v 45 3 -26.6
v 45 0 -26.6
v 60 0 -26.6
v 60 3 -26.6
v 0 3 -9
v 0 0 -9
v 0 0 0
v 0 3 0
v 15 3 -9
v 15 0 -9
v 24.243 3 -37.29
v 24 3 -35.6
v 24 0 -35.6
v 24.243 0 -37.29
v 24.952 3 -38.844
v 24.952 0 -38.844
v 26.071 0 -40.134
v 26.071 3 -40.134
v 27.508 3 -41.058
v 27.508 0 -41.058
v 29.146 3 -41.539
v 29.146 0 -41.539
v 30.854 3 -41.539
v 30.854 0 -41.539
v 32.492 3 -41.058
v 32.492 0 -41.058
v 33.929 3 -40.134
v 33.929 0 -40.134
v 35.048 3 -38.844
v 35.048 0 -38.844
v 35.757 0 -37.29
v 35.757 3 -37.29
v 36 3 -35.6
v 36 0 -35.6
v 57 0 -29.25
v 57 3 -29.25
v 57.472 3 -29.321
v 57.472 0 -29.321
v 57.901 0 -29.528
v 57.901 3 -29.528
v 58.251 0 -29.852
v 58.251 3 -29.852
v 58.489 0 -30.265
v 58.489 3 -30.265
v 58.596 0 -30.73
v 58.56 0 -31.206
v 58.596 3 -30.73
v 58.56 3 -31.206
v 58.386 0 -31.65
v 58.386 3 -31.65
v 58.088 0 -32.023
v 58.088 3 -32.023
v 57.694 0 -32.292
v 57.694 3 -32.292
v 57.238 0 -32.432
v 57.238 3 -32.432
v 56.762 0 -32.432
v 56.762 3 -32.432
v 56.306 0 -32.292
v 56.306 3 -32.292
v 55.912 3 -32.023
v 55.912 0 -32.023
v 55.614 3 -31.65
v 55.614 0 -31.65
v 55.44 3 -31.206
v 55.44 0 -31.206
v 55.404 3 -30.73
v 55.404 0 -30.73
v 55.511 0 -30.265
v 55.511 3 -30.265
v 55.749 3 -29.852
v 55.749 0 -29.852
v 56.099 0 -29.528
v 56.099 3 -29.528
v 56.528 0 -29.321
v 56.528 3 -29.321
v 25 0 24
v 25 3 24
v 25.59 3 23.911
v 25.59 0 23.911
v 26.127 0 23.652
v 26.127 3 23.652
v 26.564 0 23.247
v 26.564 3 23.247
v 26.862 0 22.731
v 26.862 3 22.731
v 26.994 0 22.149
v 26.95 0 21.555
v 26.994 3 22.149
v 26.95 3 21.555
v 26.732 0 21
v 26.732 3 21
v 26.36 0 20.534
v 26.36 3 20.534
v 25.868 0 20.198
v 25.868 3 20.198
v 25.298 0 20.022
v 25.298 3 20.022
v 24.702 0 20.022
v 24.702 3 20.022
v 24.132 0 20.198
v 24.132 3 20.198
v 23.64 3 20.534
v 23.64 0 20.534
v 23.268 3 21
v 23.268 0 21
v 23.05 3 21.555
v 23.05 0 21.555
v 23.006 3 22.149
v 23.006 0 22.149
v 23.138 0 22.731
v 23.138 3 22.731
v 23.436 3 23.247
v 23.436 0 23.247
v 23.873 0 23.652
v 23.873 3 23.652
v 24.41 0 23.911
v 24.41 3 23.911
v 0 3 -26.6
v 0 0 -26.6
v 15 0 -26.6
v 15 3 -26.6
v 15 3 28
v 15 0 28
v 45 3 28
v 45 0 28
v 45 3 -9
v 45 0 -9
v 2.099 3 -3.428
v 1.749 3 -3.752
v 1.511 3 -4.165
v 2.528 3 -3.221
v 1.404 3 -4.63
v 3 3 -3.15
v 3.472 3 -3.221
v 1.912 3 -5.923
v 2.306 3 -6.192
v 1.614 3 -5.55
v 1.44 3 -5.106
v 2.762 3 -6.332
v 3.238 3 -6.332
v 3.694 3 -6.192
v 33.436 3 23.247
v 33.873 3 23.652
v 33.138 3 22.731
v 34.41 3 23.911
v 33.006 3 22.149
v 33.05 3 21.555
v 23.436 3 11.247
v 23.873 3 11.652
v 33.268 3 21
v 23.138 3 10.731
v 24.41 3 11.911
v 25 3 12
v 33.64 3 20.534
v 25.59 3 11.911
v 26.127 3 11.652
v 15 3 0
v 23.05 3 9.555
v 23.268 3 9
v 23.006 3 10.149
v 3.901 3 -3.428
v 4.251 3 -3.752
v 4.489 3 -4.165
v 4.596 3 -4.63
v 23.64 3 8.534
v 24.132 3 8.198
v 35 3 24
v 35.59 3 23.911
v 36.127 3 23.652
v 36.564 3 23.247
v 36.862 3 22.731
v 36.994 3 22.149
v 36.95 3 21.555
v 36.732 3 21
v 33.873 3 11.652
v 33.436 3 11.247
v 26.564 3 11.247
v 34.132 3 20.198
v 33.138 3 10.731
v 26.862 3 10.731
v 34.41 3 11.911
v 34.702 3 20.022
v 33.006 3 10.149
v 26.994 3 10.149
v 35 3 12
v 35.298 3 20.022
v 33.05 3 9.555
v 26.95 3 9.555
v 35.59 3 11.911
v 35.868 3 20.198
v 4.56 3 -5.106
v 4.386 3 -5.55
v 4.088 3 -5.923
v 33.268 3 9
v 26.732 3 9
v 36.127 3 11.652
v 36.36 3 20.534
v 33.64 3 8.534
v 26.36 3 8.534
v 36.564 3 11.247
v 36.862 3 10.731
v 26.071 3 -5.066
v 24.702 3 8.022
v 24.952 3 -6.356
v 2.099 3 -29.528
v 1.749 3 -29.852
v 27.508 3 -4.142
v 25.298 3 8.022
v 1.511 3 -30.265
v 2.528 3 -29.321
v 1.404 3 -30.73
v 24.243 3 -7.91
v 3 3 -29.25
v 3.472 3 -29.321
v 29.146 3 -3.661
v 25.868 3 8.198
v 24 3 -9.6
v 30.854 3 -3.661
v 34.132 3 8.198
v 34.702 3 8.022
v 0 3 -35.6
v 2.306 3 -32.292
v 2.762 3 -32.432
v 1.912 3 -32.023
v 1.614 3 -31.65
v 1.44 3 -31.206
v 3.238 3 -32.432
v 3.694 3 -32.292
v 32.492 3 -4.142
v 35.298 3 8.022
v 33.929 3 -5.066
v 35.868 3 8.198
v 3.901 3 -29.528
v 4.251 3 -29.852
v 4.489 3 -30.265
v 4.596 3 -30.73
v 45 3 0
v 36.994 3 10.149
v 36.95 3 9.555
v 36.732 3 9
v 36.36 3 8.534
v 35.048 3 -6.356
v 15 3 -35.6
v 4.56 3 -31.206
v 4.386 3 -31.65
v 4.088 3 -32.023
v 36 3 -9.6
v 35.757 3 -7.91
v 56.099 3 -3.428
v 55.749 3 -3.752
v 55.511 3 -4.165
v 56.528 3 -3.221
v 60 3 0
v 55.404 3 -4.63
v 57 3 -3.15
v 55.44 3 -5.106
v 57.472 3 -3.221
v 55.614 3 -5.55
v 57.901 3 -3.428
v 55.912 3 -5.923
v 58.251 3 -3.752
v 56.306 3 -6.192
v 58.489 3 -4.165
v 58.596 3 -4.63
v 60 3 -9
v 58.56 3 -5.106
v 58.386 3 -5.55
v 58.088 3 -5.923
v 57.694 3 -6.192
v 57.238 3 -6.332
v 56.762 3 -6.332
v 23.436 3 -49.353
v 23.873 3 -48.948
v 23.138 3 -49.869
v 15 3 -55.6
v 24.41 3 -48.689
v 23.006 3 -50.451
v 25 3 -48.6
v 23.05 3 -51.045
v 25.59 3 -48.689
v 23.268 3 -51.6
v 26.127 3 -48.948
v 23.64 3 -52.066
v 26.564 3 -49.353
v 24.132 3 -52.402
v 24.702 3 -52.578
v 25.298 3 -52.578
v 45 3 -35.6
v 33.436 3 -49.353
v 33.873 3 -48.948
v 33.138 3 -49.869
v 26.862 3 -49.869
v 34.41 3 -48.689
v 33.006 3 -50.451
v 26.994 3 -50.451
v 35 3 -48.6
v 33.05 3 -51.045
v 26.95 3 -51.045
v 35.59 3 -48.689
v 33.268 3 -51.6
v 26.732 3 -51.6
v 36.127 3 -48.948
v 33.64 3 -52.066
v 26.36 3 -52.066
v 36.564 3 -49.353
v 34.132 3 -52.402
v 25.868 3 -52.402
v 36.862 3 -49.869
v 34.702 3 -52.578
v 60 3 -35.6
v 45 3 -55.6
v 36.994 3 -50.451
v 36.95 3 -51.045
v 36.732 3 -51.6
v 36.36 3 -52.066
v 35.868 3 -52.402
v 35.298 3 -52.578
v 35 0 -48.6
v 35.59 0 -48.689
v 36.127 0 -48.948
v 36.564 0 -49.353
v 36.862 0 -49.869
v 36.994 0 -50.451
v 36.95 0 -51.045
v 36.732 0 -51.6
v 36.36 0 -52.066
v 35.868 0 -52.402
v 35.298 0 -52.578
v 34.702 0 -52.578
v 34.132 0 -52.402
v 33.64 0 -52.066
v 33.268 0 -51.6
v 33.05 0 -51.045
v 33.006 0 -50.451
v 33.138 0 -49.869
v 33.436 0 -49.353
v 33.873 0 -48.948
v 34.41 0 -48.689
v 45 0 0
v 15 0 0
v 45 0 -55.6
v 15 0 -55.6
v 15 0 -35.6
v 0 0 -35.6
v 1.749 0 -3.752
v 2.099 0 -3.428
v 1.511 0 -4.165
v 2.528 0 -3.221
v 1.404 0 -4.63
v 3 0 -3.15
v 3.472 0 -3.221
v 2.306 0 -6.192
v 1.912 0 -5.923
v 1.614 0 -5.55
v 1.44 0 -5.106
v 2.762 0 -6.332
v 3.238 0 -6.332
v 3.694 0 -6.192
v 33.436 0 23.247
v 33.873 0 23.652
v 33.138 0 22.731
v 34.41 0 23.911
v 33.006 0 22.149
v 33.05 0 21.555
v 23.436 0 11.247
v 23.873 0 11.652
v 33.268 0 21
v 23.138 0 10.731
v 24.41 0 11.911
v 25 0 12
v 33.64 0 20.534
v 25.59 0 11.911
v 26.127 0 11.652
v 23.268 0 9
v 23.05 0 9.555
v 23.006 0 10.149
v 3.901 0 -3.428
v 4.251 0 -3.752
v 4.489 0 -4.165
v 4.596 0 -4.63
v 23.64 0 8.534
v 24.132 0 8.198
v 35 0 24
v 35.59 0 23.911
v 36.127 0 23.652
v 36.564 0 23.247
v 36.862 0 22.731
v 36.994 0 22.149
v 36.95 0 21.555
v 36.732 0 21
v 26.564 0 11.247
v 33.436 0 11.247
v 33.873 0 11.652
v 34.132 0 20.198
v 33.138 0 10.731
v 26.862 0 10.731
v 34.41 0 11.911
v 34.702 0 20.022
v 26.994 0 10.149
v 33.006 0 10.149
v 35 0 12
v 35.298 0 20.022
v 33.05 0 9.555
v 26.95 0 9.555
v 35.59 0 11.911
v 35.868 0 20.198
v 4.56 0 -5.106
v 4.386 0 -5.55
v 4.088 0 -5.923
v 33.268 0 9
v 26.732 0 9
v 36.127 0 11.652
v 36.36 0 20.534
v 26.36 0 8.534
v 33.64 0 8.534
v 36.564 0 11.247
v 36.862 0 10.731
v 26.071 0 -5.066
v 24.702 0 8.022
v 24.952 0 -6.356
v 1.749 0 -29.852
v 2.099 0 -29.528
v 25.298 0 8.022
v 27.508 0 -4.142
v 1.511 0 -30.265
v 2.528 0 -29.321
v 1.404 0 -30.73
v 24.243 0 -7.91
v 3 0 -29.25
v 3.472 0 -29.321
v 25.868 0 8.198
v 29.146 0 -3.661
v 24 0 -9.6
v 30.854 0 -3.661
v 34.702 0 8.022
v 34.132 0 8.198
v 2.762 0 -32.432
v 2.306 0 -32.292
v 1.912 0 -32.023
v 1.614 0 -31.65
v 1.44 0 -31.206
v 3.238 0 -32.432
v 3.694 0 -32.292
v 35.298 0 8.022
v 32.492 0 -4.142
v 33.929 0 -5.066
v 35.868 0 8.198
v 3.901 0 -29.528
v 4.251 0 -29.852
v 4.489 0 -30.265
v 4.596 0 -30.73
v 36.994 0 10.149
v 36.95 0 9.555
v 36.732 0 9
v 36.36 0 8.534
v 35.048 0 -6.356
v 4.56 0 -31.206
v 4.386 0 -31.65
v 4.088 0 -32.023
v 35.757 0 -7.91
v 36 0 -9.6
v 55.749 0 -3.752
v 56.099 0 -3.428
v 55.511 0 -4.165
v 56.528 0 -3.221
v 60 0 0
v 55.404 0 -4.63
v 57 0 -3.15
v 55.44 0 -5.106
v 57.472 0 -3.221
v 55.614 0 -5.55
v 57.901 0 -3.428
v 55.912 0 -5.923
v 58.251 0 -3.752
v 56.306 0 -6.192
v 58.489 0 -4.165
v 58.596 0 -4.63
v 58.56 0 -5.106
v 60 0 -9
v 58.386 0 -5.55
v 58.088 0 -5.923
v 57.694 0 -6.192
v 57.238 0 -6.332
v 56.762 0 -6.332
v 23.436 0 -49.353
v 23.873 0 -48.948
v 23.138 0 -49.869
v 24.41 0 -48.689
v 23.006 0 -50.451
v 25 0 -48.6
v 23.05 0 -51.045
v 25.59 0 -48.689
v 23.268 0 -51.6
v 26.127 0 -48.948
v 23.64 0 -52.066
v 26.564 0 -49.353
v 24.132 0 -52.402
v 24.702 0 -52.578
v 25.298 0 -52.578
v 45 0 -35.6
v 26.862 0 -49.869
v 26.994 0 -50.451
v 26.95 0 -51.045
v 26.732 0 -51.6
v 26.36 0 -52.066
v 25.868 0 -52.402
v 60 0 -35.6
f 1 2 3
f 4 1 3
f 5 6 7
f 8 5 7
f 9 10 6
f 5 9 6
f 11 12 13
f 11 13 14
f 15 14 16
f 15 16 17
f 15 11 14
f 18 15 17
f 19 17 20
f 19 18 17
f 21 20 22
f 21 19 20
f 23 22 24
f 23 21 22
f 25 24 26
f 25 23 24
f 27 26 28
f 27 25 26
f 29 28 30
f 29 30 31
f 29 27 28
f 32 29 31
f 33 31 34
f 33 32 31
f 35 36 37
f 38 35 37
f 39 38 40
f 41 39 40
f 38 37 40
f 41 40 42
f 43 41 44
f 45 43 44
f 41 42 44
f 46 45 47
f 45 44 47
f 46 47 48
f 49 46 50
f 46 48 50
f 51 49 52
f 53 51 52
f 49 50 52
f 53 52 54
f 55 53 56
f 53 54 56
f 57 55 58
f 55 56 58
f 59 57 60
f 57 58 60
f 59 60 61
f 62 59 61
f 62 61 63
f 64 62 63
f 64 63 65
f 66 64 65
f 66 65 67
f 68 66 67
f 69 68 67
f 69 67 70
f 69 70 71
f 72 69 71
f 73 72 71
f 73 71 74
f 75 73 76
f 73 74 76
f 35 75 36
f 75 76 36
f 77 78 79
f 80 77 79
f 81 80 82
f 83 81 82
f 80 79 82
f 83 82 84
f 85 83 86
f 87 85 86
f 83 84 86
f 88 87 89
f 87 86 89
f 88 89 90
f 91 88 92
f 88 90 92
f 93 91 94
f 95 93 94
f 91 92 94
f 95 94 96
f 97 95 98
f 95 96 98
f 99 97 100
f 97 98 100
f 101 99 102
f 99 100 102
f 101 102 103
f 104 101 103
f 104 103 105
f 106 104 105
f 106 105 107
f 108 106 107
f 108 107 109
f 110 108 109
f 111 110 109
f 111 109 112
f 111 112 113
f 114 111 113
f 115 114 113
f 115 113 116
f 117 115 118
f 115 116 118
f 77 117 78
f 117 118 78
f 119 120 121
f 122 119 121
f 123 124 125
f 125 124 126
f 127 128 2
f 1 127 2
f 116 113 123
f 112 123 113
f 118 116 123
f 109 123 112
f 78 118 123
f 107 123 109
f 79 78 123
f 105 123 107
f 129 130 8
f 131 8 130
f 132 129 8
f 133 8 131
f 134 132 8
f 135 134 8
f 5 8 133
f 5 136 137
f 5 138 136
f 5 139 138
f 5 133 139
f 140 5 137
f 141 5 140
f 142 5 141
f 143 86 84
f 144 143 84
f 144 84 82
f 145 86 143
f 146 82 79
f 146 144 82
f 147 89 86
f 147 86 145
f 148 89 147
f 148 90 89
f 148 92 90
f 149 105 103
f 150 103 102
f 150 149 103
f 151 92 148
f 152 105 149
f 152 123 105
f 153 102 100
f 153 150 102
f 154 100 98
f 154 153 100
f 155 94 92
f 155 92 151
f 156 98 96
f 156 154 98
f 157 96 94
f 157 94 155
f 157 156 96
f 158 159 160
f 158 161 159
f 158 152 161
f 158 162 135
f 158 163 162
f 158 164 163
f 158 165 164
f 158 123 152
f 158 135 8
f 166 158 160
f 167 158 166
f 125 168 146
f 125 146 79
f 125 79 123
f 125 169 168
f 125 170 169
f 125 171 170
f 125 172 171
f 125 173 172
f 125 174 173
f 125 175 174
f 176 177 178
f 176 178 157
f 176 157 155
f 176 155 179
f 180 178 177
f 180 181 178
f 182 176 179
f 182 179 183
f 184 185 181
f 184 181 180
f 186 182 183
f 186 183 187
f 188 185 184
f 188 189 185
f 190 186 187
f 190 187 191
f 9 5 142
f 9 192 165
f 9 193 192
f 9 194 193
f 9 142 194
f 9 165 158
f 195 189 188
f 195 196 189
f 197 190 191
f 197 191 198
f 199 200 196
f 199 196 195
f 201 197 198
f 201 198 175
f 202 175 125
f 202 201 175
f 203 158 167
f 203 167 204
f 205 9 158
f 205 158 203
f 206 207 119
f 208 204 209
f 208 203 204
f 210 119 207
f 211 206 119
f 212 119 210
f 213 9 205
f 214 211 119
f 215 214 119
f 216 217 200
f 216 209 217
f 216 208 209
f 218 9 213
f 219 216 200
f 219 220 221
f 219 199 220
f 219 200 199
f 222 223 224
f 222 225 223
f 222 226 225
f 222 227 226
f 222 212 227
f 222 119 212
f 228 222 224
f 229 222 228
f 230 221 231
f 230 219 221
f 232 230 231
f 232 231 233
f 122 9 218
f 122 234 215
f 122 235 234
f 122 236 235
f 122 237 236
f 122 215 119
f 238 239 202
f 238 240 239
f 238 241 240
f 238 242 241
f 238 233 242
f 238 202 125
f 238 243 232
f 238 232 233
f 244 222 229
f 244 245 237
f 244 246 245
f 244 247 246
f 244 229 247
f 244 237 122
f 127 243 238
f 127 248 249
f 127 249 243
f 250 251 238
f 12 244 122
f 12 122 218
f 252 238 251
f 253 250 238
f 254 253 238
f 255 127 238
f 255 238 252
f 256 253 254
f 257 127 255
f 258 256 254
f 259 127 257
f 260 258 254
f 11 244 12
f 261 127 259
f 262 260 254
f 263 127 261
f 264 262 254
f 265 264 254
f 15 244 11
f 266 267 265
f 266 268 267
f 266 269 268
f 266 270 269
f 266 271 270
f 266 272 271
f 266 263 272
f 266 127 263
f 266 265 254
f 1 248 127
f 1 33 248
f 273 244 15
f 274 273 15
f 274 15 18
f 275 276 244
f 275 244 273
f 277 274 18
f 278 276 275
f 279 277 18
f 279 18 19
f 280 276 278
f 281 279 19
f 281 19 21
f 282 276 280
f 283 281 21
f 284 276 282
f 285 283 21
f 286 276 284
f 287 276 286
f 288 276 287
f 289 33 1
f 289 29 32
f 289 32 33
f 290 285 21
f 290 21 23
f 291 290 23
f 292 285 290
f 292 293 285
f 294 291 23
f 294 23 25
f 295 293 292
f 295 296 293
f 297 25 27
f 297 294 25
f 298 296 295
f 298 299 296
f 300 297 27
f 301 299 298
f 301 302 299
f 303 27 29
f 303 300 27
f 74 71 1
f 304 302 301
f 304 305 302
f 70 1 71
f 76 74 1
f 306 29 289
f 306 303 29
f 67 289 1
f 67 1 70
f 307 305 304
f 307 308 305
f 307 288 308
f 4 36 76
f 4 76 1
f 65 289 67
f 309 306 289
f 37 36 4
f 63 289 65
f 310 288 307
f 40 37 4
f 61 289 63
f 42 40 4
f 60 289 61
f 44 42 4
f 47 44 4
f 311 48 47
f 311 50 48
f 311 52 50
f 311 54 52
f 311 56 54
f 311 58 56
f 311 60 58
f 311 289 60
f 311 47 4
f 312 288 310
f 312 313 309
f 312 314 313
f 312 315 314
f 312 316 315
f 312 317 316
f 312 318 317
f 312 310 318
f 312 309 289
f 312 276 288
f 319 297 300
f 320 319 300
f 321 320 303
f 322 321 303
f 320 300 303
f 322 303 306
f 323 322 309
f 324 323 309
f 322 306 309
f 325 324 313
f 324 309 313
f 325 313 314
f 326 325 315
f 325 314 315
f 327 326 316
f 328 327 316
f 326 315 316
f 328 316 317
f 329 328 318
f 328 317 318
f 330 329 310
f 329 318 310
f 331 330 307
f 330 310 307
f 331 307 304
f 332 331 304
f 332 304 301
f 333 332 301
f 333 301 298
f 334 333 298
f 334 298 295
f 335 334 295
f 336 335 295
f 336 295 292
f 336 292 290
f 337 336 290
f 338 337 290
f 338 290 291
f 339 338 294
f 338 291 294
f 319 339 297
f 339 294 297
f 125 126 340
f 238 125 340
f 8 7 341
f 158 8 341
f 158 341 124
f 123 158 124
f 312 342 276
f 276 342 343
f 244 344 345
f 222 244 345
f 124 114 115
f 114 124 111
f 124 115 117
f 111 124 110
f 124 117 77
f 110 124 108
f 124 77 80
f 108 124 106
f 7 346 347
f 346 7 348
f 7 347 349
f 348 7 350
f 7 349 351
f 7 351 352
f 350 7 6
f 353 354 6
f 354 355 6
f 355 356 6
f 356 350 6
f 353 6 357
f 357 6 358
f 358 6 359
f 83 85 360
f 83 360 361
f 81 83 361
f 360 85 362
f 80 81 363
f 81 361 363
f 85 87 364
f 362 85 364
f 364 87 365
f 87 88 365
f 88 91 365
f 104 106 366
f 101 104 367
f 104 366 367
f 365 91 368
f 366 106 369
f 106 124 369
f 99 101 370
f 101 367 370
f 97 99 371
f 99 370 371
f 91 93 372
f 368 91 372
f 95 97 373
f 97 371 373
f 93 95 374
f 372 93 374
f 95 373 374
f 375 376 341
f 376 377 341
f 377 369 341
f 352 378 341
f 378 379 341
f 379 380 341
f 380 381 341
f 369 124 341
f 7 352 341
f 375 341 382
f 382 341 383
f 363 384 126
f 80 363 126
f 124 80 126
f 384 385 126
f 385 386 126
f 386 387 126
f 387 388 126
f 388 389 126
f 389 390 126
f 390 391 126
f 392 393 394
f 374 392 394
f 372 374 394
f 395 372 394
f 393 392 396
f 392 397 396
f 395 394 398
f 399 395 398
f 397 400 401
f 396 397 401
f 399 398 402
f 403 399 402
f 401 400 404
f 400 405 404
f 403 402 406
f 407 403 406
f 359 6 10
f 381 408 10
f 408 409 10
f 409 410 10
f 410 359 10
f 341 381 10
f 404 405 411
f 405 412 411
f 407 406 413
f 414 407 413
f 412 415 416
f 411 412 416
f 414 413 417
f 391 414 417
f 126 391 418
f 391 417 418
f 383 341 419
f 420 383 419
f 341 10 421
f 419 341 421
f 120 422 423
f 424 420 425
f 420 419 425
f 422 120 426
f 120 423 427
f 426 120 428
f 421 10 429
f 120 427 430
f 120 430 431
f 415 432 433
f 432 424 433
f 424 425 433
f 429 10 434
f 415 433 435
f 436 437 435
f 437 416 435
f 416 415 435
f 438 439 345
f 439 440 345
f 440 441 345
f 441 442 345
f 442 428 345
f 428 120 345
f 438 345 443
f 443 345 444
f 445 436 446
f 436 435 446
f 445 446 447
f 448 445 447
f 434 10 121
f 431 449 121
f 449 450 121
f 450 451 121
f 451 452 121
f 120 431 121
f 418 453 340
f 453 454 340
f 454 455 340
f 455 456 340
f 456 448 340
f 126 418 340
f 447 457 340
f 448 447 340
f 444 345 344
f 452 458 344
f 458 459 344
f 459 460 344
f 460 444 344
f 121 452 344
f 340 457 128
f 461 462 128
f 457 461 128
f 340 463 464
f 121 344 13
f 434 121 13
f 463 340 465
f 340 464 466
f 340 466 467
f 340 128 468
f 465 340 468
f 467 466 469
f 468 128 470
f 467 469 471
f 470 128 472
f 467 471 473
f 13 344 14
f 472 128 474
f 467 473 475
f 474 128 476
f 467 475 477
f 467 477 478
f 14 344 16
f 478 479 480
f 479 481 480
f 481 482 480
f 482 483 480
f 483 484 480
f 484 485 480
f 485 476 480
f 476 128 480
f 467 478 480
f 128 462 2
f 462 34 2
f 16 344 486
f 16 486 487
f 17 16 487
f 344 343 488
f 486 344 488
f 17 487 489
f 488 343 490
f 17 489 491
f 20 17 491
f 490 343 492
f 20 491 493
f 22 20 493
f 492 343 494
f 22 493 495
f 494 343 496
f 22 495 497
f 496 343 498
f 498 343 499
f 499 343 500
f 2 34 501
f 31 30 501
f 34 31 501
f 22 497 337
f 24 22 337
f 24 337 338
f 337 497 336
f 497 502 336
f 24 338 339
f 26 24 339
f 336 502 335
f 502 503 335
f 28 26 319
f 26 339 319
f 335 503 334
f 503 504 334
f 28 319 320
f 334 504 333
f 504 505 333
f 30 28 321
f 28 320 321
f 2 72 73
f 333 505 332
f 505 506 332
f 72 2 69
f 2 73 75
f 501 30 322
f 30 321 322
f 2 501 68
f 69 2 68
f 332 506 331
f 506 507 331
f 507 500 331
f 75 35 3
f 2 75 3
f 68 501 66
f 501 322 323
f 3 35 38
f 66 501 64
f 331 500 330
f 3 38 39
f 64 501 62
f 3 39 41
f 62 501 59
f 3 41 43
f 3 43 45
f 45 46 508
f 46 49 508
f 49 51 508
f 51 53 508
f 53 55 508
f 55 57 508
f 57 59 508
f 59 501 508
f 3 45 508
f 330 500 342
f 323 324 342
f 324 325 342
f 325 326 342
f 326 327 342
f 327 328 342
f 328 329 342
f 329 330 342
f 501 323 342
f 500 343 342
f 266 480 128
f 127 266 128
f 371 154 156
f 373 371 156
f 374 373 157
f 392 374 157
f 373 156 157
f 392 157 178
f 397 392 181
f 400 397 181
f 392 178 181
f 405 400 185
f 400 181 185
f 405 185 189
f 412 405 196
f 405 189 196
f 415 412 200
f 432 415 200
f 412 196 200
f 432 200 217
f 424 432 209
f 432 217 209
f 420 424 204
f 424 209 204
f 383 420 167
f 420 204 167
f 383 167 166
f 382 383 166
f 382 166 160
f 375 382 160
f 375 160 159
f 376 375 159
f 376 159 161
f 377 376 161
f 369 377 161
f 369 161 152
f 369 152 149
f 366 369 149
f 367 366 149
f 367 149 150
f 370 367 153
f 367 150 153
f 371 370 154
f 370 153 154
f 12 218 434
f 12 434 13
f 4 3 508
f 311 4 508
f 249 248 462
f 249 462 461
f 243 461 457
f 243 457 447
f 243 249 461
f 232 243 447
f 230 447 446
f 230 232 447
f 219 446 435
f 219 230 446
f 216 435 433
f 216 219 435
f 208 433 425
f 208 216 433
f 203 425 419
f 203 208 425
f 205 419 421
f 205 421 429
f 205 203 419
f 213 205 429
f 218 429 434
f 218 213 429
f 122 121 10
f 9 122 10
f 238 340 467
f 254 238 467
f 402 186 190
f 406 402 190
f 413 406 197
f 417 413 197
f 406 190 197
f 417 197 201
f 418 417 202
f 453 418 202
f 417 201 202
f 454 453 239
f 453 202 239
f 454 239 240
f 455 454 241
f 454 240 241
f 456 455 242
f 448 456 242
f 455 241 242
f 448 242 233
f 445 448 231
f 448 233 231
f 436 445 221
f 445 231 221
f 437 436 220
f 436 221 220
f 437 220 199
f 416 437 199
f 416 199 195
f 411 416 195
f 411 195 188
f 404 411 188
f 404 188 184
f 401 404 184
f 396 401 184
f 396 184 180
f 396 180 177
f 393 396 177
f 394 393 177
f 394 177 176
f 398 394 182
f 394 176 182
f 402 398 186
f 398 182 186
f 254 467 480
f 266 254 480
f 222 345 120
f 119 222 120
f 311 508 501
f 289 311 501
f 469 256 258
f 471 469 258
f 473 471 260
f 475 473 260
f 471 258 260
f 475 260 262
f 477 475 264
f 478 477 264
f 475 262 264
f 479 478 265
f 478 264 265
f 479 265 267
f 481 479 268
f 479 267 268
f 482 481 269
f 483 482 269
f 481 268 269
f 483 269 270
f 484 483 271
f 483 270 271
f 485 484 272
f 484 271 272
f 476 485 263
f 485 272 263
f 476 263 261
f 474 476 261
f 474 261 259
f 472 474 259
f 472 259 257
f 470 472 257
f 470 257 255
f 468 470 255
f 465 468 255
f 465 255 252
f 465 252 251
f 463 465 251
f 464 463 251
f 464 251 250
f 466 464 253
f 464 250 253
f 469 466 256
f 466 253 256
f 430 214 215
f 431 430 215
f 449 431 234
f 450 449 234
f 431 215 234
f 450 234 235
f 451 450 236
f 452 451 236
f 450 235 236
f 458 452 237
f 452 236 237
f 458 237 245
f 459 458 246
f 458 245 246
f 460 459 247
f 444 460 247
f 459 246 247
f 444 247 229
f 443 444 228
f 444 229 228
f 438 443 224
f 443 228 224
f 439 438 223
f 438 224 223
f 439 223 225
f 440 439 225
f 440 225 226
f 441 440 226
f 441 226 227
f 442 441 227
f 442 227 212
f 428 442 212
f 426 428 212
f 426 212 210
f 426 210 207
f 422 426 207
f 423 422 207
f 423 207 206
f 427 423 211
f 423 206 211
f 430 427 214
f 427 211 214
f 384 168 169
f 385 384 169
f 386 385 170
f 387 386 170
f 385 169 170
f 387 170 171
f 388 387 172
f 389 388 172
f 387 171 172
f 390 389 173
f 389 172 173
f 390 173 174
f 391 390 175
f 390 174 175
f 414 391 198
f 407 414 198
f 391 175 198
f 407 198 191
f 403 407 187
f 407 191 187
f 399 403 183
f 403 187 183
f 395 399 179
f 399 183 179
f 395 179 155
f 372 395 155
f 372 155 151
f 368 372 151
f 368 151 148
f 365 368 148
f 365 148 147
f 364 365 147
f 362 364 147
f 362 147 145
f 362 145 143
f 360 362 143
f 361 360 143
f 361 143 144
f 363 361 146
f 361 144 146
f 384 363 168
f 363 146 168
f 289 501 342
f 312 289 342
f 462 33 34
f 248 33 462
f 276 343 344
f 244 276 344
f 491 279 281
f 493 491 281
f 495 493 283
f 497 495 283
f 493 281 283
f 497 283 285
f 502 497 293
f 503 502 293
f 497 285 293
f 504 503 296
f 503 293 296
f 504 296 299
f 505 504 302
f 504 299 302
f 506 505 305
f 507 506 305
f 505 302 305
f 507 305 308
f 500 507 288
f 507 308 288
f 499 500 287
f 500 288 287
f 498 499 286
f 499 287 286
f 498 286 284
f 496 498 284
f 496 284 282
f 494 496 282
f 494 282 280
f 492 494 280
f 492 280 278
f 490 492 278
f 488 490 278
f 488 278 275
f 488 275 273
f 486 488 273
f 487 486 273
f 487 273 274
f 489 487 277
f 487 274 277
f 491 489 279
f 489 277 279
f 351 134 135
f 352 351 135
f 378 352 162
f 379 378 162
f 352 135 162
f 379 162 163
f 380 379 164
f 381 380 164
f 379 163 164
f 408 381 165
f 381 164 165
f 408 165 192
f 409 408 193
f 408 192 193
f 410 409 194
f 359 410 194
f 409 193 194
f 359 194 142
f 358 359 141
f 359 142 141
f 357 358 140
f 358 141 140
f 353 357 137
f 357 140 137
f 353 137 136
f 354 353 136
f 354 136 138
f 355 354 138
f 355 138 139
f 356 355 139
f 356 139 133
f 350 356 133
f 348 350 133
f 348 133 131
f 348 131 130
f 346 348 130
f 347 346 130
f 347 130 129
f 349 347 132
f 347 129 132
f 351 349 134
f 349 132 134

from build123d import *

# Parameters (mm, degrees)
EXTRUDE_1_DEPTH     = 3
SKETCH_2_R          = 1.6
CUT_EXTRUDE_1_DEPTH = 3
SKETCH_3_R          = 2
CUT_EXTRUDE_2_DEPTH = 3
CUT_EXTRUDE_3_DEPTH = 3


with BuildPart() as part:
    # 草图1 → 凸台-拉伸1 (new body)
    with BuildSketch(Plane(origin=(0, 0, 0), x_dir=(1, 0, 0), z_dir=(0, 1, 0))):
        Polygon((0, 0), (15, 0), (15, -28), (45, -28), (45, 0), (60, 0), (60, 9), (45, 9), (45, 26.6), (60, 26.6), (60, 35.6), (45, 35.6), (45, 55.6), (15, 55.6), (15, 35.6), (0, 35.6), (0, 26.6), (15, 26.6), (15, 9), (0, 9), align=None)
    extrude(amount=EXTRUDE_1_DEPTH)

    # 草图2 → 切除-拉伸1 (cut)
    with BuildSketch(Plane(origin=(0, 3, 0), x_dir=(1, 0, 0), z_dir=(0, 1, 0))):
        with Locations(Location((3, 4.75, 0), (0, 0, 270))):
            Circle(SKETCH_2_R)
        with Locations(Location((3, 30.85, 0), (0, 0, 270))):
            Circle(SKETCH_2_R)
        with Locations(Location((57, 30.85, 0), (0, 0, 270))):
            Circle(SKETCH_2_R)
        with Locations(Location((57, 4.75, 0), (0, 0, 270))):
            Circle(SKETCH_2_R)
    extrude(amount=-CUT_EXTRUDE_1_DEPTH, mode=Mode.SUBTRACT)

    # 草图3 → 切除-拉伸2 (cut)
    with BuildSketch(Plane(origin=(0, 3, 0), x_dir=(1, 0, 0), z_dir=(0, 1, 0))):
        with Locations(Location((25, 50.6, 0), (0, 0, 270))):
            Circle(SKETCH_3_R)
        with Locations(Location((35, 50.6, 0), (0, 0, 270))):
            Circle(SKETCH_3_R)
        with Locations(Location((35, -22, 0), (0, 0, 270))):
            Circle(SKETCH_3_R)
        with Locations(Location((25, -22, 0), (0, 0, 270))):
            Circle(SKETCH_3_R)
        with Locations(Location((25, -10, 0), (0, 0, 270))):
            Circle(SKETCH_3_R)
        with Locations(Location((35, -10, 0), (0, 0, 270))):
            Circle(SKETCH_3_R)
    extrude(amount=-CUT_EXTRUDE_2_DEPTH, mode=Mode.SUBTRACT)

    # 草图4 → 切除-拉伸3 (cut)
    with BuildSketch(Plane(origin=(0, 3, 0), x_dir=(1, 0, 0), z_dir=(0, 1, 0))):
        with BuildLine():
            Line((36, 35.6), (36, 9.6))
            ThreePointArc((36, 9.6), (30, 3.6), (24, 9.6))
            Line((24, 9.6), (24, 35.6))
            ThreePointArc((24, 35.6), (30, 41.6), (36, 35.6))
        make_face()
    extrude(amount=-CUT_EXTRUDE_3_DEPTH, mode=Mode.SUBTRACT)


solid = part.part
